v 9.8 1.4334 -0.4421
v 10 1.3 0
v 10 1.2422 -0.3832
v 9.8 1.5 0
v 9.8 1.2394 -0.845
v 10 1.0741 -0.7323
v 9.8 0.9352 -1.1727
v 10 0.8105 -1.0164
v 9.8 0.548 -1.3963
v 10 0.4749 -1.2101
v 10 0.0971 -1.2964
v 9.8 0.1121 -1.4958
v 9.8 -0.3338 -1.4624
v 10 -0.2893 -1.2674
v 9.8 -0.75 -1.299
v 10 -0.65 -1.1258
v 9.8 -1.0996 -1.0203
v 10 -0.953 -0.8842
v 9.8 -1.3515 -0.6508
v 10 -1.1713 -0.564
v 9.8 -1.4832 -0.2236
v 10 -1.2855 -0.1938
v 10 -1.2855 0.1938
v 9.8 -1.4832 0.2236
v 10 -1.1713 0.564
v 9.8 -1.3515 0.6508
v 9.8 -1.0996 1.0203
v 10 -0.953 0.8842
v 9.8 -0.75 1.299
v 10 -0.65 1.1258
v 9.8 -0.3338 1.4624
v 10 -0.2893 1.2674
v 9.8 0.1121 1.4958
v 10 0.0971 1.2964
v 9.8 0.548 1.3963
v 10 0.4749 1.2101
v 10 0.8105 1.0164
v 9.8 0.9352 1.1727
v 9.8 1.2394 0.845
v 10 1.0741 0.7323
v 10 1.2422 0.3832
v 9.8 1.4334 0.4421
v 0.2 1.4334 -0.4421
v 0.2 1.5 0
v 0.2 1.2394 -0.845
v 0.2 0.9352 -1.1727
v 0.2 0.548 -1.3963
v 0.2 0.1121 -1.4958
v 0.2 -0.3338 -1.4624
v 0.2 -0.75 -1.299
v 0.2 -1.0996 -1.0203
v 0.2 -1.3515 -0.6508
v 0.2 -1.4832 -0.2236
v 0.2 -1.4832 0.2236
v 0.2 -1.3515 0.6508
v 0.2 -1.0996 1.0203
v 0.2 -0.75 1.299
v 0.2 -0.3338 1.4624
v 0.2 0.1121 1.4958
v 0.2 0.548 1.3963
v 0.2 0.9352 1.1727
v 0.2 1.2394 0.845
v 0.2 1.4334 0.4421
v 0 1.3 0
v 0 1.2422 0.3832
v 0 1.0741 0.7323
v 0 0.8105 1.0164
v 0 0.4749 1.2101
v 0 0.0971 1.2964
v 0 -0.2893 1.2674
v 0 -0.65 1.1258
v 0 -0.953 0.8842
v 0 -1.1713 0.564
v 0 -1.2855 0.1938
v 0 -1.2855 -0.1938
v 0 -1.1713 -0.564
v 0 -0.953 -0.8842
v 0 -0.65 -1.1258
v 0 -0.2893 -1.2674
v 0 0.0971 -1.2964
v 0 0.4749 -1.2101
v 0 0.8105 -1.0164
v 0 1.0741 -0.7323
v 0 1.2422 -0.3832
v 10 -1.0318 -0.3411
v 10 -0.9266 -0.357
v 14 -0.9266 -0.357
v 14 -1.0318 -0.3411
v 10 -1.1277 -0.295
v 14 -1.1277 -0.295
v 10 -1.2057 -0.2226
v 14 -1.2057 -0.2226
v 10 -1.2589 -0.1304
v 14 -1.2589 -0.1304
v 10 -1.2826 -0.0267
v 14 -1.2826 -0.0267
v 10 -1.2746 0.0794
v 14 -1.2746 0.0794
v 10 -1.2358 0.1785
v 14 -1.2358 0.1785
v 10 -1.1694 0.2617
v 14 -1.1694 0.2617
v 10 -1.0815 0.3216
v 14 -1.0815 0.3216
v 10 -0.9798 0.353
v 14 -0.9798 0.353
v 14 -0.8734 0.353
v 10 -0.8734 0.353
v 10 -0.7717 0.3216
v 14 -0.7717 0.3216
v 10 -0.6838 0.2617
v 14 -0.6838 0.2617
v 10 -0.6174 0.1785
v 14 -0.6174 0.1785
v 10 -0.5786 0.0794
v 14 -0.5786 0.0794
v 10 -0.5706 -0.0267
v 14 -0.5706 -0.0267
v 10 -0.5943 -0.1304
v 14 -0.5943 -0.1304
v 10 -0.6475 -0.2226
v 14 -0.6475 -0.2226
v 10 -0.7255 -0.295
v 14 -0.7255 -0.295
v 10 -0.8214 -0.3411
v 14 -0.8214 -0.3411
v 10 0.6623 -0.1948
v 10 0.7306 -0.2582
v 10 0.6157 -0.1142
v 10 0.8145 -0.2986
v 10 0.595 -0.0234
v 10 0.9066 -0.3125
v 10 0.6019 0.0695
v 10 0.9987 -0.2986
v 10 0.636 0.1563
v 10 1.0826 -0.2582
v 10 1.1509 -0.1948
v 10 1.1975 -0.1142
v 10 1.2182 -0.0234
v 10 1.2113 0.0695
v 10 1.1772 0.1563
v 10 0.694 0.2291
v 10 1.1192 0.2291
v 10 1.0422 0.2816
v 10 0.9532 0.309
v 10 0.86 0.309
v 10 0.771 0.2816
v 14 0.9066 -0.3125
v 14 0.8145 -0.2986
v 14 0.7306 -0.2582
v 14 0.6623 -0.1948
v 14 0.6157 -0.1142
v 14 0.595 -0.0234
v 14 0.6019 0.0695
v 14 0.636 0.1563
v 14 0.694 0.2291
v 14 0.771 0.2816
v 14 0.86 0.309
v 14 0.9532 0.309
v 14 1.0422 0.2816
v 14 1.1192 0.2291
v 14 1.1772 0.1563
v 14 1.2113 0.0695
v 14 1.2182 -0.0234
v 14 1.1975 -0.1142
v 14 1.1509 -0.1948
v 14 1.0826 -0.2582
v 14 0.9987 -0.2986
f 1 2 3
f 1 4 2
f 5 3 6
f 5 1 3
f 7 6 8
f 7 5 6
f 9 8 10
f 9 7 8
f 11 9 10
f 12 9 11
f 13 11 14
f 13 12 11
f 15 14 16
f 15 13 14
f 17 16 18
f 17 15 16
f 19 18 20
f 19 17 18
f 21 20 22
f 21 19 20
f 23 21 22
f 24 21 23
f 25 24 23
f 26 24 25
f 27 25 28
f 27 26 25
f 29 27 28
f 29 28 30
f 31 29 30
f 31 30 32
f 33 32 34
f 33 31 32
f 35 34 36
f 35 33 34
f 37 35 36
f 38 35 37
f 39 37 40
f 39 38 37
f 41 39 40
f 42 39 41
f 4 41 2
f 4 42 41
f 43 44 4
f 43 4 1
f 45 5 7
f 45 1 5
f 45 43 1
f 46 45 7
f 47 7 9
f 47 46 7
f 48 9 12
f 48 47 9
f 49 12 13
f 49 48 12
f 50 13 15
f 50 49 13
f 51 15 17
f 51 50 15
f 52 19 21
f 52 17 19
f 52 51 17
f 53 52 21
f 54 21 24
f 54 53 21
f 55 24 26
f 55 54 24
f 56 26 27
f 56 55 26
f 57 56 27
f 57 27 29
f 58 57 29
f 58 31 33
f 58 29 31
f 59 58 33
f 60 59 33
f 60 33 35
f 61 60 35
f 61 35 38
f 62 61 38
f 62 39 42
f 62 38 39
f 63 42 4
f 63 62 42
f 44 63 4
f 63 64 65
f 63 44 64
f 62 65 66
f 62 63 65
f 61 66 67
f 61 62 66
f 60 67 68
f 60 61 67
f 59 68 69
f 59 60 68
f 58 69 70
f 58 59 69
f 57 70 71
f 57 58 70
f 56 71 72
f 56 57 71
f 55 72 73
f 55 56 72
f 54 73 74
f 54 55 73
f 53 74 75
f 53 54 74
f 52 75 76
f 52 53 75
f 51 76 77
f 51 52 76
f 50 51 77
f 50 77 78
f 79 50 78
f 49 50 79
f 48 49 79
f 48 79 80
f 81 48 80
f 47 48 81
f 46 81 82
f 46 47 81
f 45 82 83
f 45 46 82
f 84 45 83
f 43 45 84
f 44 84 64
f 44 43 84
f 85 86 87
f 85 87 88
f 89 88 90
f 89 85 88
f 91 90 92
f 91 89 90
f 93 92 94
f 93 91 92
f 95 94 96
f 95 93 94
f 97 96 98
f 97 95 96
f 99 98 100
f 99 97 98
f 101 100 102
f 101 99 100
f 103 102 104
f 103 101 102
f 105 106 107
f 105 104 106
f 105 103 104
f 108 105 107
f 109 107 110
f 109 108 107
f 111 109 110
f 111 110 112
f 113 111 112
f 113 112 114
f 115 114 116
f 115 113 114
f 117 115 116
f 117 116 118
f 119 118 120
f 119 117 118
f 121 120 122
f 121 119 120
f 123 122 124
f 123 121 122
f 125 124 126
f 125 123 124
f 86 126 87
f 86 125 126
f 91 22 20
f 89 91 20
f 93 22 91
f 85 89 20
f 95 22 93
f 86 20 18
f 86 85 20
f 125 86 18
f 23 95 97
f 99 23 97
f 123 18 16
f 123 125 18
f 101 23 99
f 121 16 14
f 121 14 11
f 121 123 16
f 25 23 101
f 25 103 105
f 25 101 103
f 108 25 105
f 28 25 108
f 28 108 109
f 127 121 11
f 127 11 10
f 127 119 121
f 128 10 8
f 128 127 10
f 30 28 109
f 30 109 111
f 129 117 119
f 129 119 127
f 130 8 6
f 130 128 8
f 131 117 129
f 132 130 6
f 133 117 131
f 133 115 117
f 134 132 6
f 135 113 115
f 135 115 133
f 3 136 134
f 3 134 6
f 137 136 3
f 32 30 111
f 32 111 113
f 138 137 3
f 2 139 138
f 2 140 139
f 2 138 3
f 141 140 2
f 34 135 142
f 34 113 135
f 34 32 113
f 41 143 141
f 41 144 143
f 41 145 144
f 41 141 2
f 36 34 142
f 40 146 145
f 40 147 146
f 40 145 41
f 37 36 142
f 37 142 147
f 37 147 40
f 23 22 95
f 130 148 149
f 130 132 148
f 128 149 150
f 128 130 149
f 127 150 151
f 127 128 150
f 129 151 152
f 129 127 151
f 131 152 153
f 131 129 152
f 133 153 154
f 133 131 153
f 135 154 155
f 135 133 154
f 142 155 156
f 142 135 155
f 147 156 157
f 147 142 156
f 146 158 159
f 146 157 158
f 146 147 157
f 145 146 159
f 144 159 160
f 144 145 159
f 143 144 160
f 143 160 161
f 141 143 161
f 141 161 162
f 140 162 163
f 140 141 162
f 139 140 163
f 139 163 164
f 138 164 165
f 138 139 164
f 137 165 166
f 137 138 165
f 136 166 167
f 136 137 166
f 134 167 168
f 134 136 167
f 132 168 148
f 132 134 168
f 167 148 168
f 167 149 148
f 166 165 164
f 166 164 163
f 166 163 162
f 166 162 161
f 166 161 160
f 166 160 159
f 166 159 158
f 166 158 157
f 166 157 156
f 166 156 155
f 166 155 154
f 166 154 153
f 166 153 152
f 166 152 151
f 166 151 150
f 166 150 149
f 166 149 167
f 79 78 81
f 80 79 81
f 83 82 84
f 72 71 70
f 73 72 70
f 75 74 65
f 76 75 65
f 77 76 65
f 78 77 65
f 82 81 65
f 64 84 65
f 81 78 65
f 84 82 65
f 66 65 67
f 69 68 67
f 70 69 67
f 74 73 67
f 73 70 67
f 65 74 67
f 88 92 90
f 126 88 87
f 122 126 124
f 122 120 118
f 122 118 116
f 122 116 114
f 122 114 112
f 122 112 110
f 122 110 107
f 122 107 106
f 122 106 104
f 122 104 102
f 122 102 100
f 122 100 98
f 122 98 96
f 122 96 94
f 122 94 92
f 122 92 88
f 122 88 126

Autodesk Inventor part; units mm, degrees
ref_plane "YZ Plane" through (0, 0, 0) normal (1, 0, 0) x (0, 1, 0)
ref_plane "XZ Plane" through (0, 0, 0) normal (0, 1, 0) x (-1, 0, 0)
ref_plane "XY Plane" through (0, 0, 0) normal (0, 0, 1) x (1, 0, 0)
sketch "Эскиз1" plane through (0, 0, 0) normal (1, 0, 0) x (0, 1, 0)
  circle A0 centre (0, 0) radius 1.5
  dimension "d0" = 3
extrude "Выдавливание1" add sketch "Эскиз1" along normal blind 10
sketch "Эскиз2" plane through (10, 0, 0) normal (1, 0, 0) x (0, 0, -1)
  circle A0 centre (0, 0.9066) radius 0.3125
  circle A1 centre (0, -0.9266) radius 0.357
  point P0 (0, 0)
extrude "Выдавливание2" add sketch "Эскиз2" along normal blind 4
chamfer "Фаска1" distance 0.2 angle 45 2 edges at (10, -1.5, 0) (0, -1.5, 0)
properties part number "термодатчик1"
